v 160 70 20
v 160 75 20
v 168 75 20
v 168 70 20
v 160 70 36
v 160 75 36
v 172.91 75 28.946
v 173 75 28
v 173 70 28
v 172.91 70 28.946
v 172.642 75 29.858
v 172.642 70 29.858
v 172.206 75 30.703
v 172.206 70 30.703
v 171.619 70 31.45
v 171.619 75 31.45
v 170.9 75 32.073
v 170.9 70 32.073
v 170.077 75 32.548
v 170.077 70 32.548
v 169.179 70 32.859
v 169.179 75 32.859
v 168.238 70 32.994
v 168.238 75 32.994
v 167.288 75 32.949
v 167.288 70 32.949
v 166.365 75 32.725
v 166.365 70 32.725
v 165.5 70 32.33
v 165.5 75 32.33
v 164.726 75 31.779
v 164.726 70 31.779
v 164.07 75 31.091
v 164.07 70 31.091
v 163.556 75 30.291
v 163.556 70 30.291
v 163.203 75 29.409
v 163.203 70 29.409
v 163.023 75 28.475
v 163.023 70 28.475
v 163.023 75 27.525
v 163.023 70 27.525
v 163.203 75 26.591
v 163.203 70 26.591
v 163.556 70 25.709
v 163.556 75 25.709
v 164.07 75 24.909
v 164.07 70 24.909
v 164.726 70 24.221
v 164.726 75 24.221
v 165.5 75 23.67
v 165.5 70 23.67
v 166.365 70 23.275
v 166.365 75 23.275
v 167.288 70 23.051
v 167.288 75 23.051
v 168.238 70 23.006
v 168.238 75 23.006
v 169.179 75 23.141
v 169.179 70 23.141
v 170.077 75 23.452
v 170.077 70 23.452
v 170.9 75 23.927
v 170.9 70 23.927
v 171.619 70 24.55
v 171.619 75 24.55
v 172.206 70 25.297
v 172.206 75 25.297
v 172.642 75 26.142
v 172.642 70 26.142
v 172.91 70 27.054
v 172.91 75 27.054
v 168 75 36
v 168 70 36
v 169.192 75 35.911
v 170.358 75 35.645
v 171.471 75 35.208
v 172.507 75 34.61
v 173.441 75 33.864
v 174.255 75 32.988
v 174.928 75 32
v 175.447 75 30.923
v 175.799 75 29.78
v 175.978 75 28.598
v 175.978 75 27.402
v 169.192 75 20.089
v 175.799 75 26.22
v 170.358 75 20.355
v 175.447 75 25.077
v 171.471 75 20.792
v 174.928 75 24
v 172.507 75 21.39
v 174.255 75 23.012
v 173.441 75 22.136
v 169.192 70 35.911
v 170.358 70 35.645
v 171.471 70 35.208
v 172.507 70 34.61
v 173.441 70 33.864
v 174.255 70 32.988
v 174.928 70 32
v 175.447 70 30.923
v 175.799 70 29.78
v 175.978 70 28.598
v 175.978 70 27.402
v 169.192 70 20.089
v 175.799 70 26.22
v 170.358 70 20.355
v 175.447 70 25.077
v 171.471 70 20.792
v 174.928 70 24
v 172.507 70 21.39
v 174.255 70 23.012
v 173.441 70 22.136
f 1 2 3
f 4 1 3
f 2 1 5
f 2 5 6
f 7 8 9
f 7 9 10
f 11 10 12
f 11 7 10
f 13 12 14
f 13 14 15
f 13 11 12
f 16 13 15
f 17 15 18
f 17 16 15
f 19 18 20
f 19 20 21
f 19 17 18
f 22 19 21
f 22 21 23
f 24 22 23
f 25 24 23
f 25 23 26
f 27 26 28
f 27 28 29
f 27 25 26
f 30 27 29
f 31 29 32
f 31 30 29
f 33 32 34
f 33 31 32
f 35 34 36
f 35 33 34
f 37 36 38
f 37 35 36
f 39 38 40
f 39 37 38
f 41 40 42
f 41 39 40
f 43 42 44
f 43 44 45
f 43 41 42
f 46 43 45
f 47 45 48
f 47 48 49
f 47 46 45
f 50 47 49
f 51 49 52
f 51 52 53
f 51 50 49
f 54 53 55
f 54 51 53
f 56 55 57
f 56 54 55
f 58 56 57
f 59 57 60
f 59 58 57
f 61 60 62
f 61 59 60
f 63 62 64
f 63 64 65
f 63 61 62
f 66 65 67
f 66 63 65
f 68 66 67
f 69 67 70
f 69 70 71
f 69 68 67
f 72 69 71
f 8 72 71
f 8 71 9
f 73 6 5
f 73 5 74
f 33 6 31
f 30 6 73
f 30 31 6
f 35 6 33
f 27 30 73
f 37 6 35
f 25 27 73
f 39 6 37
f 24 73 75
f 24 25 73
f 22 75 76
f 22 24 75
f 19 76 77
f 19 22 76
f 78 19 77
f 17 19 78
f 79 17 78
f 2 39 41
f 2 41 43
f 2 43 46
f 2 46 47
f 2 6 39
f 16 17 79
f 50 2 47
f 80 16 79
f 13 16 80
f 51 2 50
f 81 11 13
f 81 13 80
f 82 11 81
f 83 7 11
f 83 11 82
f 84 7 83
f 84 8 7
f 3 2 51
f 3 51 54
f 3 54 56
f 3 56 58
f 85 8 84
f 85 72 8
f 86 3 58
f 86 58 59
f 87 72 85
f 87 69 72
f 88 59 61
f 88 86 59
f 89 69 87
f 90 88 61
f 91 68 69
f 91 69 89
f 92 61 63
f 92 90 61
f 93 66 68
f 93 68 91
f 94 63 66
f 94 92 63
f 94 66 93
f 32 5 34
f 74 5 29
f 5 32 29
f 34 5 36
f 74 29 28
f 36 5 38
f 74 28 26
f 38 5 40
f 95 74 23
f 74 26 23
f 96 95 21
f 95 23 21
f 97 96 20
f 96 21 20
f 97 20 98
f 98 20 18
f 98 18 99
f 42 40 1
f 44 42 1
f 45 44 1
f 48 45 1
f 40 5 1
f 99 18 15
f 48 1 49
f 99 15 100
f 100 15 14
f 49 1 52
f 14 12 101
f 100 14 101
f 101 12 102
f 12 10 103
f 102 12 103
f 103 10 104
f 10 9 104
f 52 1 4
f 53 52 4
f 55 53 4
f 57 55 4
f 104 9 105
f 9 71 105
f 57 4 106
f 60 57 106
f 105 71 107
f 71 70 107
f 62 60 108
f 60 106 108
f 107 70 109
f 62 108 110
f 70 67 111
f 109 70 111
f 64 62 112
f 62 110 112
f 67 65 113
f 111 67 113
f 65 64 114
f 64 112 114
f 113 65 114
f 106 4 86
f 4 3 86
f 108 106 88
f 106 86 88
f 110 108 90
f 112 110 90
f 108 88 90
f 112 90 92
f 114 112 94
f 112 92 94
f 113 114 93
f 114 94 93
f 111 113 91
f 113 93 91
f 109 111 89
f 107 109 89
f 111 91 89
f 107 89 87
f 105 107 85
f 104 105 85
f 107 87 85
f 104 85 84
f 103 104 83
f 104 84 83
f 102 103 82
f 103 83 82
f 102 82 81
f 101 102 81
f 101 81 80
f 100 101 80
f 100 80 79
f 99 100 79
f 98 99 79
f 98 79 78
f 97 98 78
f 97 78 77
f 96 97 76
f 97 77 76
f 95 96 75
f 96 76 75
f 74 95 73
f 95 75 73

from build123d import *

# Parameters (mm, degrees)
CYLINDER024_R          = 5
CYLINDER024_DEPTH      = 5
CYLINDER024_ROLL_ANGLE = 90
BOX031_W               = 8
BOX031_H               = 5
BOX031_DEPTH           = 16
CYLINDER023_R          = 8
CYLINDER023_DEPTH      = 5
CYLINDER023_ROLL_ANGLE = 90


with BuildPart() as zylinder010:
    # Cylinder024 → Cylinder024 (new body)
    with BuildSketch(Plane.XY):
        Circle(CYLINDER024_R)
    extrude(amount=CYLINDER024_DEPTH)


with BuildPart() as zylinder010_1:
    # Cylinder024 roll: moved
    add(zylinder010.part.rotate(Axis((0, 0, 0), (1, 0, 0)), CYLINDER024_ROLL_ANGLE))


with BuildPart() as zylinder010_2:
    # Cylinder024 placement: moved
    add(zylinder010_1.part.moved(Location((8, 5, 8))))


with BuildPart() as w_rfel024:
    # Box031 → Box031 (new body)
    with BuildSketch(Plane.XY):
        with Locations((4, 2.5)):
            Rectangle(BOX031_W, BOX031_H)
    extrude(amount=BOX031_DEPTH)


with BuildPart() as fixier_se_schmal:
    # Cylinder023 → Cylinder023 (new body)
    with BuildSketch(Plane.XY):
        Circle(CYLINDER023_R)
    extrude(amount=CYLINDER023_DEPTH)


with BuildPart() as fixier_se_schmal_1:
    # Cylinder023 roll: moved
    add(fixier_se_schmal.part.rotate(Axis((0, 0, 0), (1, 0, 0)), CYLINDER023_ROLL_ANGLE))


with BuildPart() as fixier_se_schmal_2:
    # Cylinder023 placement: moved
    add(fixier_se_schmal_1.part.moved(Location((8, 5, 8))))

    # Fusion016: union Würfel024
    add(w_rfel024.part)

    # Cut021: cut Zylinder010
    add(zylinder010_2.part, mode=Mode.SUBTRACT)


with BuildPart() as fixier_se_schmal_3:
    # Cut021 placement: moved
    add(fixier_se_schmal_2.part.moved(Location((160, 70, 20))))


solid = fixier_se_schmal_3.part
